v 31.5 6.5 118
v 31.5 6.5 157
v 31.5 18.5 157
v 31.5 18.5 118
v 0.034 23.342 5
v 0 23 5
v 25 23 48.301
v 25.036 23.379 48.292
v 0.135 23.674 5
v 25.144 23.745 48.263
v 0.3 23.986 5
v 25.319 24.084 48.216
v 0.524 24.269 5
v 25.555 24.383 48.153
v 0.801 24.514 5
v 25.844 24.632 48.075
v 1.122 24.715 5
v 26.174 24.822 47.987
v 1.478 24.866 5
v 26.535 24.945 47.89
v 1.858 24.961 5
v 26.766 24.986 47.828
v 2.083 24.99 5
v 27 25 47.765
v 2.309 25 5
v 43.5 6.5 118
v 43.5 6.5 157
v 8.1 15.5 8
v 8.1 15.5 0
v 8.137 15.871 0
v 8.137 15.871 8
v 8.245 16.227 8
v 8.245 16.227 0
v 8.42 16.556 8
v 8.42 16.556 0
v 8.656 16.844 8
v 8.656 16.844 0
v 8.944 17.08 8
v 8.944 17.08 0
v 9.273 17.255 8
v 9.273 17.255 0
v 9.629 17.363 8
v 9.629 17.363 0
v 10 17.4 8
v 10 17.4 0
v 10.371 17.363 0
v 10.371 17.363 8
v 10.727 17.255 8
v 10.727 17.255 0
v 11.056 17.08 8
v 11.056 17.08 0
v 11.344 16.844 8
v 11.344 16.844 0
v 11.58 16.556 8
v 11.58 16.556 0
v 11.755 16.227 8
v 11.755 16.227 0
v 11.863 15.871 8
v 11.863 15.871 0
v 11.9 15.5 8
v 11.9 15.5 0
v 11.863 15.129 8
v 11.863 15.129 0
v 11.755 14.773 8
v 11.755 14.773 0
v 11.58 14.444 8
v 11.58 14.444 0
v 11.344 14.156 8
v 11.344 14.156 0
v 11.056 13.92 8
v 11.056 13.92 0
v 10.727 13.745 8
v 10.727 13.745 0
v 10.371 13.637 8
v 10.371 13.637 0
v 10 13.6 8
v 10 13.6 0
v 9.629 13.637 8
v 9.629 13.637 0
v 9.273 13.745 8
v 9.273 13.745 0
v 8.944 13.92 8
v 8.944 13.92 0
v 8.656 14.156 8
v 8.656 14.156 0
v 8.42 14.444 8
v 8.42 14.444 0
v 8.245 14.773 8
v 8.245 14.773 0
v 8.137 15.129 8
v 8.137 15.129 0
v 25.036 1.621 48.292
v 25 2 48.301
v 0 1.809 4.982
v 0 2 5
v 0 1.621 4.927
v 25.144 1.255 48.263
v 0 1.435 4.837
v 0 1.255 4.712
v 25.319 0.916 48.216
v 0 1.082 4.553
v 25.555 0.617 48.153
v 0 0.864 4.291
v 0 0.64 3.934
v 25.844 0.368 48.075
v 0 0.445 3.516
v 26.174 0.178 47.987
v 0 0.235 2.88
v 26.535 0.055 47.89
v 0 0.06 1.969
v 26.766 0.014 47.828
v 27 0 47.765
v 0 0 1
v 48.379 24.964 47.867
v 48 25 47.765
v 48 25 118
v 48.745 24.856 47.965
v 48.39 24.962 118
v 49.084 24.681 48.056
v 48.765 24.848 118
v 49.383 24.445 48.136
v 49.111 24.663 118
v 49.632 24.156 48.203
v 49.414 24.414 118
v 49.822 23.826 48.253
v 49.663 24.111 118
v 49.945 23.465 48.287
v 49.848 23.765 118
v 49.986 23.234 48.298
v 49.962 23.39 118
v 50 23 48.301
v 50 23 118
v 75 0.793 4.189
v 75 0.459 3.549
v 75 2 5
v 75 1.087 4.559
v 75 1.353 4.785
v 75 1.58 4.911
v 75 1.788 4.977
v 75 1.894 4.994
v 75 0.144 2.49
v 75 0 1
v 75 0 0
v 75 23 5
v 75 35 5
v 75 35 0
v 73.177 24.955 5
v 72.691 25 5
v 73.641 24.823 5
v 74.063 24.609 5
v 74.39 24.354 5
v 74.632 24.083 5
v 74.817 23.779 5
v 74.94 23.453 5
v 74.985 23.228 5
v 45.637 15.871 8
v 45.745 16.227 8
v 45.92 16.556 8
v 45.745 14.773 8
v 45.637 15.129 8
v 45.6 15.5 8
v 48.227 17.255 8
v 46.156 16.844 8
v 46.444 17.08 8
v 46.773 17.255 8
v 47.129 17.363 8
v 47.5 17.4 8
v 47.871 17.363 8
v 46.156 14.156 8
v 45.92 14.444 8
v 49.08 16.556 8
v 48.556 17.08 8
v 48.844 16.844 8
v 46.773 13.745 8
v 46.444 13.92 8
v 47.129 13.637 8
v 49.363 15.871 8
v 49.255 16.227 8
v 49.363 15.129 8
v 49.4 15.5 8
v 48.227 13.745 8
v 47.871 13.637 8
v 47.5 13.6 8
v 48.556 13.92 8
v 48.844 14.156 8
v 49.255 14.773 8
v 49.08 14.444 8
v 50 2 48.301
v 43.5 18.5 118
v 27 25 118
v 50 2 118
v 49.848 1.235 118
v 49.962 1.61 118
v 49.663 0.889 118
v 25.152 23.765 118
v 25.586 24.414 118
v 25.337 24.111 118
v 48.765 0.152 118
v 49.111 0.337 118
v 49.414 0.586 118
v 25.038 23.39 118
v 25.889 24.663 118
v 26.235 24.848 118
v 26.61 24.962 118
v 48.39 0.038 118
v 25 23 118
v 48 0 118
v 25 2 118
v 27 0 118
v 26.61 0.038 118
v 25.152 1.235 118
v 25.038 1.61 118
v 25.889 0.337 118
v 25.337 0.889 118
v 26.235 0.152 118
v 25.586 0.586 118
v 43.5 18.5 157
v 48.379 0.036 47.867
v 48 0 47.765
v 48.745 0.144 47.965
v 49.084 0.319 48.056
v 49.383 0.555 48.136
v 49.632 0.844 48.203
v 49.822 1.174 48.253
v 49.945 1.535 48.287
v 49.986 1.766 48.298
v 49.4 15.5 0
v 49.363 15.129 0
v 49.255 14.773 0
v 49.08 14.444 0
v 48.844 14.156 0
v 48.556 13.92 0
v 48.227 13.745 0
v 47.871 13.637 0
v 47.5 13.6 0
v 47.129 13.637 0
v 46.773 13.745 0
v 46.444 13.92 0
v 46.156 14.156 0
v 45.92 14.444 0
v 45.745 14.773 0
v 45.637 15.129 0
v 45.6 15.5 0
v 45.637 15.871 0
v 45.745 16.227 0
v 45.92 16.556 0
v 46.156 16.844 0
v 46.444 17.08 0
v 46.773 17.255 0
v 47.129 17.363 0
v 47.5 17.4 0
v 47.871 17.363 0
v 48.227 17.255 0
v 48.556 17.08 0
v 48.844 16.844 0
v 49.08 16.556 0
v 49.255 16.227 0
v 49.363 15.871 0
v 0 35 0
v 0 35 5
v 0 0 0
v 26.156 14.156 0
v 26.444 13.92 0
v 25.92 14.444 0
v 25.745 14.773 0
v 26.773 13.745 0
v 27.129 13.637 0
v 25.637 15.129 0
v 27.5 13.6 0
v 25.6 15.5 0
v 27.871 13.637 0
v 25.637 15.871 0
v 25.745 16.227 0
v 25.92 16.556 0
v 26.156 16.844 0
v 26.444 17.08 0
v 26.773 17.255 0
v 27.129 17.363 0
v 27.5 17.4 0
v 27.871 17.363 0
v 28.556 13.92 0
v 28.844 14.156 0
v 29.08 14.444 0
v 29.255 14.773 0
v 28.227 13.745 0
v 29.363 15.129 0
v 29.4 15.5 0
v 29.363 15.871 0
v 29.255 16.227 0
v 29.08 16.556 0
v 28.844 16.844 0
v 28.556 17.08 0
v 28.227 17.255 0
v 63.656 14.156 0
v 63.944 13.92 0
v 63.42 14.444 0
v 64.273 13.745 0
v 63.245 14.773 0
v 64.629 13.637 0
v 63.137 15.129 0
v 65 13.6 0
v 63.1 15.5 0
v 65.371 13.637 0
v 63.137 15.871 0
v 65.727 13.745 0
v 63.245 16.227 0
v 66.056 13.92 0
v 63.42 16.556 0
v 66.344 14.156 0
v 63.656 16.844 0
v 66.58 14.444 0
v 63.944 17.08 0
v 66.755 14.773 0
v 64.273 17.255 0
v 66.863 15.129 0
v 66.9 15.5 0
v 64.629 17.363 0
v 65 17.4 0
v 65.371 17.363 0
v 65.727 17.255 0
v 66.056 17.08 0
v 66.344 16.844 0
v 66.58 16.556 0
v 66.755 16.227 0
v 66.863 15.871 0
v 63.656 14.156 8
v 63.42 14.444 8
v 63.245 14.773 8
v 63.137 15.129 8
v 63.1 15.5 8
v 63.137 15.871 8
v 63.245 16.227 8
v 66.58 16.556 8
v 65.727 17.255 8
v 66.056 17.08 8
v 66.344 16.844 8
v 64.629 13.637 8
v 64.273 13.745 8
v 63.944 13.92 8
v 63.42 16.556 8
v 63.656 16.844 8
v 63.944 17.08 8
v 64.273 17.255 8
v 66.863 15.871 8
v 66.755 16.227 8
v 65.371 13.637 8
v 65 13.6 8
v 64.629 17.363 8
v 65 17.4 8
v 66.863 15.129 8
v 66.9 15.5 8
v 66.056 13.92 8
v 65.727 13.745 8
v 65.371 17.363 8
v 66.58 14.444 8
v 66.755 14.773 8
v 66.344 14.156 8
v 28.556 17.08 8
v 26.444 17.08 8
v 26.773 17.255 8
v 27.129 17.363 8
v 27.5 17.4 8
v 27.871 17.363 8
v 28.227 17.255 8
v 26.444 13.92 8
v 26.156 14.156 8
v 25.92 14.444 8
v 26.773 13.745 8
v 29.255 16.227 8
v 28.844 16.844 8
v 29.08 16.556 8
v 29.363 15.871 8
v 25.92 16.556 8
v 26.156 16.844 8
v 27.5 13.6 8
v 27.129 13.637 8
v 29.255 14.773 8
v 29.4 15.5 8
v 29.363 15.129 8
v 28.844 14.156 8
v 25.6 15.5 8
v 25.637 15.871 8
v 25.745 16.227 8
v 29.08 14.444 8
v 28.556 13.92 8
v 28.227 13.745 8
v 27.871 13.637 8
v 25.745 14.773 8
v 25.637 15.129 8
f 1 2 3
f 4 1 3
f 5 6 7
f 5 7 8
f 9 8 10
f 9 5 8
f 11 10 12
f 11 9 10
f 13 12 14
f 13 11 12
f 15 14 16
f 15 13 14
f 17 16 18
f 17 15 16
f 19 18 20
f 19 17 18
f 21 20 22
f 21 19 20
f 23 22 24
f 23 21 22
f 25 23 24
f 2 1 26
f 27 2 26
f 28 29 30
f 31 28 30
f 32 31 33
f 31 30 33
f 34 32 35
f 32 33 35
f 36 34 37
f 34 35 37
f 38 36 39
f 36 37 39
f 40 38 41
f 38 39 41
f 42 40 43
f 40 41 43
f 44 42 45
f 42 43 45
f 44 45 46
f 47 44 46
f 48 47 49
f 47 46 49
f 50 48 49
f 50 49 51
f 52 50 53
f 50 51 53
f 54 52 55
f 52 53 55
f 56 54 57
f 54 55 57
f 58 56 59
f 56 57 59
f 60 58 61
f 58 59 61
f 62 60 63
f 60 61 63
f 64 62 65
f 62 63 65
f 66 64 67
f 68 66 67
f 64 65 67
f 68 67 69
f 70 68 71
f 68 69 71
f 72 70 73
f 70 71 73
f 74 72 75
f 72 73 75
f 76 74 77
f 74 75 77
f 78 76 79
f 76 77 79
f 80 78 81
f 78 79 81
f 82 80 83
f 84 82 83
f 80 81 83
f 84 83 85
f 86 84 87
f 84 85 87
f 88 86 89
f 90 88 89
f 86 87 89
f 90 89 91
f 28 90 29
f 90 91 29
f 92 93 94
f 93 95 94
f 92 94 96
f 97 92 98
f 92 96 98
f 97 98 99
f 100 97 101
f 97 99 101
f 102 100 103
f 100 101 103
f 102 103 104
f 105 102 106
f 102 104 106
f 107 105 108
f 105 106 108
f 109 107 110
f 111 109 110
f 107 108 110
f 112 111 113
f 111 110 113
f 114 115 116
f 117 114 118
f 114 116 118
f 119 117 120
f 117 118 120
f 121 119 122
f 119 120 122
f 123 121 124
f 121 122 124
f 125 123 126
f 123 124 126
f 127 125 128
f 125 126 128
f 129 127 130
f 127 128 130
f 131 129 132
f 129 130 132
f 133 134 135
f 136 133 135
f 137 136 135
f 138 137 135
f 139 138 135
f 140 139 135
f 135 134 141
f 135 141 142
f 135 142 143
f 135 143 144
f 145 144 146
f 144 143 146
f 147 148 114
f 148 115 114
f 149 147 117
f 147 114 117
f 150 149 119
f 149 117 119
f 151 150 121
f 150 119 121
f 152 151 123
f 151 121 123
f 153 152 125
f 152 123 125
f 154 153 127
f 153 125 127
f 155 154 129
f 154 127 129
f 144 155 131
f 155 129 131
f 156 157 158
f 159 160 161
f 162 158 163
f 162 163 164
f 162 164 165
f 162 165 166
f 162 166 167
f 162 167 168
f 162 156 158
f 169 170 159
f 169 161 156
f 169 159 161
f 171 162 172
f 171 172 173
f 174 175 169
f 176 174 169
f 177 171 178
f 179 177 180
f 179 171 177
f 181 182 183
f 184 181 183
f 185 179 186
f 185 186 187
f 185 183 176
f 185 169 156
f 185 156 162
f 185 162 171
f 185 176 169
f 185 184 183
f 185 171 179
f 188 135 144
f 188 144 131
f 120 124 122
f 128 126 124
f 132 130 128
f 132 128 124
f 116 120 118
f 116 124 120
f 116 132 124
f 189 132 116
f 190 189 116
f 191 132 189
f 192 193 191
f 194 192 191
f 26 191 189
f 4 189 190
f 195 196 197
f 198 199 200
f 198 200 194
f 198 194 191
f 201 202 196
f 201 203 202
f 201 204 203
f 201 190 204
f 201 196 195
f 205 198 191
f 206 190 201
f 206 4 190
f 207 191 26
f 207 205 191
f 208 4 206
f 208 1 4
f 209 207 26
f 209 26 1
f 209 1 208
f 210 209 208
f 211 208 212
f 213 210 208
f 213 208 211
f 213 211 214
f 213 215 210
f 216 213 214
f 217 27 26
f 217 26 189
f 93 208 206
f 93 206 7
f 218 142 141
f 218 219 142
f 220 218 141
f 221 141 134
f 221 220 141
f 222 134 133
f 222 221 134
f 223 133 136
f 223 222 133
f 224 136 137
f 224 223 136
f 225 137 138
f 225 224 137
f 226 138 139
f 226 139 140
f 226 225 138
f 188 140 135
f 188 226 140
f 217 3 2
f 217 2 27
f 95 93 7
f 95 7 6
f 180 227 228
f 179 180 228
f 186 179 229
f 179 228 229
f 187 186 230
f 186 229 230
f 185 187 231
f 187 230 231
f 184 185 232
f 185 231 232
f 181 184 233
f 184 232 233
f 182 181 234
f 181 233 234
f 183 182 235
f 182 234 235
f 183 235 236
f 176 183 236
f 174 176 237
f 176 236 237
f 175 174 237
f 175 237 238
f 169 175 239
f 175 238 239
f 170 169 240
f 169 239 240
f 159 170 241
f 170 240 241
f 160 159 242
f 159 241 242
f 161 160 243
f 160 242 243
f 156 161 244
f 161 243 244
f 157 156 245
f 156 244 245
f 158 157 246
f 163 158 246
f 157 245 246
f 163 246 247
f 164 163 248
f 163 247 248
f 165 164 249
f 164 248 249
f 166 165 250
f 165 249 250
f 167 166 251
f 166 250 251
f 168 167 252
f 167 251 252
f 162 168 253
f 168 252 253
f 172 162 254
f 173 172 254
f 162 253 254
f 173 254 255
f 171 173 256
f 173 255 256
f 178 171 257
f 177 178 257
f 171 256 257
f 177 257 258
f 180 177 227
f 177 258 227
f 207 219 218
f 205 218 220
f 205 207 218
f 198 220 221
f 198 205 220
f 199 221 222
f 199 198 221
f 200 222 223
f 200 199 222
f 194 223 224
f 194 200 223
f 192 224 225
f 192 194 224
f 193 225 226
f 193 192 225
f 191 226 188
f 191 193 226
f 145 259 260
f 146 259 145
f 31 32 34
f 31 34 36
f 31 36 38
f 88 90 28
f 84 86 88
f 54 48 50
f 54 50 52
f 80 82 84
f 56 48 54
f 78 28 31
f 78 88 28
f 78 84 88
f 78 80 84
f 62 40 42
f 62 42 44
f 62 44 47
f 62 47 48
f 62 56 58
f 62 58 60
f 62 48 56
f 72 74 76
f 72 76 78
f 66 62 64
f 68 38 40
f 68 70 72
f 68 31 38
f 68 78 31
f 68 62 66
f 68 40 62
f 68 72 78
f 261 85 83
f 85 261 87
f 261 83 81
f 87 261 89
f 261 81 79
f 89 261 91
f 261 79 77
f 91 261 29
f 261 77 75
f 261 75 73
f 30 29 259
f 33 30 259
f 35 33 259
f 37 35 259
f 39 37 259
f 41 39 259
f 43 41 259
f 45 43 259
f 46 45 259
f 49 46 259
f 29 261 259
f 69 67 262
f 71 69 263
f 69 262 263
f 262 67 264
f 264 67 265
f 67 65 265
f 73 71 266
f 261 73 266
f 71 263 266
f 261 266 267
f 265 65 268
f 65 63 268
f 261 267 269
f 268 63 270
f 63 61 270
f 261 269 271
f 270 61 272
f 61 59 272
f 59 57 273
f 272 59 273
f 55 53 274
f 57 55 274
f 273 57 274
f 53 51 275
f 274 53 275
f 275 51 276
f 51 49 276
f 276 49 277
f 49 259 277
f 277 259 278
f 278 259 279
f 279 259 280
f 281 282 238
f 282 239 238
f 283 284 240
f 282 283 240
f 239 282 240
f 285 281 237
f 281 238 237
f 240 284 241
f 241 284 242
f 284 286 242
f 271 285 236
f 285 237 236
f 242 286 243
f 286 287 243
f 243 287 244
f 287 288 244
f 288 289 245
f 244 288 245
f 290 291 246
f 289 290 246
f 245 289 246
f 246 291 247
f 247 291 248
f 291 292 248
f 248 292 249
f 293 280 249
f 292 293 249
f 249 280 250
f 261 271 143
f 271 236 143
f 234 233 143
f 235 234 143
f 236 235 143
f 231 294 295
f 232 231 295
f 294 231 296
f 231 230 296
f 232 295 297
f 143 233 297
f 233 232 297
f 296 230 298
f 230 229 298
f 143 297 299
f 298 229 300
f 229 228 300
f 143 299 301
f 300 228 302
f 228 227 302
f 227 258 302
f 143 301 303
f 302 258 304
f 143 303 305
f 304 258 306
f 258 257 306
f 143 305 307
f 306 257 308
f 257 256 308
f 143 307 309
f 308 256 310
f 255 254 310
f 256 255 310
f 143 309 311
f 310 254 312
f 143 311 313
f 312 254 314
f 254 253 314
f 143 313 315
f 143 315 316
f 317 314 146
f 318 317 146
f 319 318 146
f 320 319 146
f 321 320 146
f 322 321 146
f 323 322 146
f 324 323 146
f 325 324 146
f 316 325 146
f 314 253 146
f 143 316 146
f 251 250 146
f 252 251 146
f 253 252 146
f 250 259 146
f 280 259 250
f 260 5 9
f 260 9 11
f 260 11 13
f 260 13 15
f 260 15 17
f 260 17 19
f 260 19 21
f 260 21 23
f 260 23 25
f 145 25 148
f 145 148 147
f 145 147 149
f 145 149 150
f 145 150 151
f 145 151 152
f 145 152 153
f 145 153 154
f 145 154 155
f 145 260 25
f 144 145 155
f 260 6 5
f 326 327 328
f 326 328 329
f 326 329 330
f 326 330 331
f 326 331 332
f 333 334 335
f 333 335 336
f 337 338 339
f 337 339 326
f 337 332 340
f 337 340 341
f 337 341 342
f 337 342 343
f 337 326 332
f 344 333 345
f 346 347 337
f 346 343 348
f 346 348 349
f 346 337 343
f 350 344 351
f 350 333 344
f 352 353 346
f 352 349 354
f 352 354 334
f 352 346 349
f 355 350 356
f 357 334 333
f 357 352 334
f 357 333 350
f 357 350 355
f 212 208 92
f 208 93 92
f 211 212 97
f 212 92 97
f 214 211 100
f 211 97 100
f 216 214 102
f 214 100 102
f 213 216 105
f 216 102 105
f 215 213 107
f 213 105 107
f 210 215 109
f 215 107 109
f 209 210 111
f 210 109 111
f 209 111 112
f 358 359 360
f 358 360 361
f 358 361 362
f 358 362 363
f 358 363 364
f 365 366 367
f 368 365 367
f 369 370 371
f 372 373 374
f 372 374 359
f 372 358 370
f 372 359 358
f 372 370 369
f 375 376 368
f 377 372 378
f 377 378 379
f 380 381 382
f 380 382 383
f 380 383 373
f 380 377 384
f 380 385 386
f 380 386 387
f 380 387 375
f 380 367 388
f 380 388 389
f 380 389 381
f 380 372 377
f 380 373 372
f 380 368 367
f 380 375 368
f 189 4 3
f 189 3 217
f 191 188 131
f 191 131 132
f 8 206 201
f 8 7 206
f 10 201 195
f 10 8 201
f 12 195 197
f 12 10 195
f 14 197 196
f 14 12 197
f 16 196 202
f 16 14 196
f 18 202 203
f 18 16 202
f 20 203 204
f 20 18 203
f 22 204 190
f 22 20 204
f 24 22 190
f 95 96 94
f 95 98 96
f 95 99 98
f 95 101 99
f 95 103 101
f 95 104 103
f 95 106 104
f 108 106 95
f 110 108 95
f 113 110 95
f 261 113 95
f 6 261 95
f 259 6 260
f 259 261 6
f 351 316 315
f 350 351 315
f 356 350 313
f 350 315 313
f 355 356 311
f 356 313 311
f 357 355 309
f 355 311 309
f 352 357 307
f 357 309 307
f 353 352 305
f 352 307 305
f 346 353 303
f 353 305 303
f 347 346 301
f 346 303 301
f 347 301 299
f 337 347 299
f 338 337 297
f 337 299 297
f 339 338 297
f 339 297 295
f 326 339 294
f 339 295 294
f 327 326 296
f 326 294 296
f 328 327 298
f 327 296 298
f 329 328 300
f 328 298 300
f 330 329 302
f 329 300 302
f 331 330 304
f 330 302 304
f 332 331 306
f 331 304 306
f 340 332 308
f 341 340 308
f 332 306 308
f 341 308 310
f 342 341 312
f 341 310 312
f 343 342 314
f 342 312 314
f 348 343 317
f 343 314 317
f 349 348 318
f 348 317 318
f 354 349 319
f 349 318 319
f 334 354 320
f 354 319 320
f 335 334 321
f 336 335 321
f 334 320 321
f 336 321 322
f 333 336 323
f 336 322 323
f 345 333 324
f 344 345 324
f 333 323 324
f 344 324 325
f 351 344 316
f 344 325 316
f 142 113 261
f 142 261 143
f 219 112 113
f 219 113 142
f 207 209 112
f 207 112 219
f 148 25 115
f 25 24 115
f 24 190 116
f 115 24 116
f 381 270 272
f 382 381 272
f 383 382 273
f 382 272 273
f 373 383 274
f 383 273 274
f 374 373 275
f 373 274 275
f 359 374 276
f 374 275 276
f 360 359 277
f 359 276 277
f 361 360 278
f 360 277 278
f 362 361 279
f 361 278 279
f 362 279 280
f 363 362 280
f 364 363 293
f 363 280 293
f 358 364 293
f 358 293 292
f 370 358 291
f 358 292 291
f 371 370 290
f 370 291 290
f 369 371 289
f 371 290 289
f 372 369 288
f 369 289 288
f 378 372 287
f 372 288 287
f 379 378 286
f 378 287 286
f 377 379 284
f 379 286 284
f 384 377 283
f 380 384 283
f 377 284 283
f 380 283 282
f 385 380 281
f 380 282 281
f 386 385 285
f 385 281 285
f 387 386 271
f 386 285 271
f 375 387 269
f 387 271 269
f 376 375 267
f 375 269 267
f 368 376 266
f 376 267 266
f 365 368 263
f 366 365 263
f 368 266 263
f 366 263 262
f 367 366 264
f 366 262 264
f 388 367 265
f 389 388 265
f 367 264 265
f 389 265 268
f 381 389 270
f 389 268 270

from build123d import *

# Parameters (mm, degrees)
F0_W     = 75
F0_H     = 35
F1_DEPTH = 5
F3_DEPTH = 25
F4_W     = 12
F4_H     = 12
F5_DEPTH = 39
F7_R     = 1.9
F8_DEPTH = 8
F9_R     = 2


with BuildPart() as f1:
    # F0 (on Top) → F1 (new body)
    with BuildSketch(Plane.XY):
        with Locations((37.5, 17.5)):
            Rectangle(F0_W, F0_H)
    extrude(amount=F1_DEPTH)

    # F2 (on face) → F3 (join)
    with BuildSketch(Plane.XZ):
        Polygon((25, 48.30127), (0, 5), (25, 5), align=None)
        Polygon((25, 48.30127), (25, 5), (50, 5), (50, 48.30127), (50, 118), (25, 118), align=None)
        Polygon((50, 48.30127), (50, 5), (75, 5), align=None)
    extrude(amount=-F3_DEPTH)

    # F4 (on face) → F5 (join)
    with BuildSketch(Plane.XY.offset(118)):
        with Locations((37.5, 12.5)):
            Rectangle(F4_W, F4_H)
    extrude(amount=F5_DEPTH)

    # F7 (on face) → F8 (cut)
    with BuildSketch(Plane(origin=(0, 0, 0), x_dir=(1, 0, 0), z_dir=(0, 0, -1))):
        with BuildLine():
            ThreePointArc((11.9, -15.5), (10, -13.6), (8.1, -15.5))
            Line((8.1, -15.5), (10, -15.5))
            Line((10, -15.5), (11.9, -15.5))
        make_face()
        with BuildLine():
            ThreePointArc((29.4, -15.5), (27.5, -13.6), (25.6, -15.5))
            ThreePointArc((25.6, -15.5), (27.5, -17.4), (29.4, -15.5))
        make_face()
        with BuildLine():
            Line((10, -15.5), (8.1, -15.5))
            ThreePointArc((8.1, -15.5), (10, -17.4), (11.9, -15.5))
            Line((11.9, -15.5), (10, -15.5))
        make_face()
        with Locations((47.5, -15.5)):
            Circle(F7_R)
        with Locations((65, -15.5)):
            Circle(F7_R)
    extrude(amount=-F8_DEPTH, mode=Mode.SUBTRACT)

    # F9
    f9_edges = [f1.edges().sort_by_distance(p)[0] for p in [
        (50, 0, 83.150635),
        (50, 25, 83.150635),
        (25, 25, 83.150635),
        (25, 0, 83.150635),
        (12.5, 0, 26.650635),
        (62.5, 0, 26.650635),
        (62.5, 25, 26.650635),
        (12.5, 25, 26.650635),
    ]]
    fillet(f9_edges, radius=F9_R)


solid = f1.part
